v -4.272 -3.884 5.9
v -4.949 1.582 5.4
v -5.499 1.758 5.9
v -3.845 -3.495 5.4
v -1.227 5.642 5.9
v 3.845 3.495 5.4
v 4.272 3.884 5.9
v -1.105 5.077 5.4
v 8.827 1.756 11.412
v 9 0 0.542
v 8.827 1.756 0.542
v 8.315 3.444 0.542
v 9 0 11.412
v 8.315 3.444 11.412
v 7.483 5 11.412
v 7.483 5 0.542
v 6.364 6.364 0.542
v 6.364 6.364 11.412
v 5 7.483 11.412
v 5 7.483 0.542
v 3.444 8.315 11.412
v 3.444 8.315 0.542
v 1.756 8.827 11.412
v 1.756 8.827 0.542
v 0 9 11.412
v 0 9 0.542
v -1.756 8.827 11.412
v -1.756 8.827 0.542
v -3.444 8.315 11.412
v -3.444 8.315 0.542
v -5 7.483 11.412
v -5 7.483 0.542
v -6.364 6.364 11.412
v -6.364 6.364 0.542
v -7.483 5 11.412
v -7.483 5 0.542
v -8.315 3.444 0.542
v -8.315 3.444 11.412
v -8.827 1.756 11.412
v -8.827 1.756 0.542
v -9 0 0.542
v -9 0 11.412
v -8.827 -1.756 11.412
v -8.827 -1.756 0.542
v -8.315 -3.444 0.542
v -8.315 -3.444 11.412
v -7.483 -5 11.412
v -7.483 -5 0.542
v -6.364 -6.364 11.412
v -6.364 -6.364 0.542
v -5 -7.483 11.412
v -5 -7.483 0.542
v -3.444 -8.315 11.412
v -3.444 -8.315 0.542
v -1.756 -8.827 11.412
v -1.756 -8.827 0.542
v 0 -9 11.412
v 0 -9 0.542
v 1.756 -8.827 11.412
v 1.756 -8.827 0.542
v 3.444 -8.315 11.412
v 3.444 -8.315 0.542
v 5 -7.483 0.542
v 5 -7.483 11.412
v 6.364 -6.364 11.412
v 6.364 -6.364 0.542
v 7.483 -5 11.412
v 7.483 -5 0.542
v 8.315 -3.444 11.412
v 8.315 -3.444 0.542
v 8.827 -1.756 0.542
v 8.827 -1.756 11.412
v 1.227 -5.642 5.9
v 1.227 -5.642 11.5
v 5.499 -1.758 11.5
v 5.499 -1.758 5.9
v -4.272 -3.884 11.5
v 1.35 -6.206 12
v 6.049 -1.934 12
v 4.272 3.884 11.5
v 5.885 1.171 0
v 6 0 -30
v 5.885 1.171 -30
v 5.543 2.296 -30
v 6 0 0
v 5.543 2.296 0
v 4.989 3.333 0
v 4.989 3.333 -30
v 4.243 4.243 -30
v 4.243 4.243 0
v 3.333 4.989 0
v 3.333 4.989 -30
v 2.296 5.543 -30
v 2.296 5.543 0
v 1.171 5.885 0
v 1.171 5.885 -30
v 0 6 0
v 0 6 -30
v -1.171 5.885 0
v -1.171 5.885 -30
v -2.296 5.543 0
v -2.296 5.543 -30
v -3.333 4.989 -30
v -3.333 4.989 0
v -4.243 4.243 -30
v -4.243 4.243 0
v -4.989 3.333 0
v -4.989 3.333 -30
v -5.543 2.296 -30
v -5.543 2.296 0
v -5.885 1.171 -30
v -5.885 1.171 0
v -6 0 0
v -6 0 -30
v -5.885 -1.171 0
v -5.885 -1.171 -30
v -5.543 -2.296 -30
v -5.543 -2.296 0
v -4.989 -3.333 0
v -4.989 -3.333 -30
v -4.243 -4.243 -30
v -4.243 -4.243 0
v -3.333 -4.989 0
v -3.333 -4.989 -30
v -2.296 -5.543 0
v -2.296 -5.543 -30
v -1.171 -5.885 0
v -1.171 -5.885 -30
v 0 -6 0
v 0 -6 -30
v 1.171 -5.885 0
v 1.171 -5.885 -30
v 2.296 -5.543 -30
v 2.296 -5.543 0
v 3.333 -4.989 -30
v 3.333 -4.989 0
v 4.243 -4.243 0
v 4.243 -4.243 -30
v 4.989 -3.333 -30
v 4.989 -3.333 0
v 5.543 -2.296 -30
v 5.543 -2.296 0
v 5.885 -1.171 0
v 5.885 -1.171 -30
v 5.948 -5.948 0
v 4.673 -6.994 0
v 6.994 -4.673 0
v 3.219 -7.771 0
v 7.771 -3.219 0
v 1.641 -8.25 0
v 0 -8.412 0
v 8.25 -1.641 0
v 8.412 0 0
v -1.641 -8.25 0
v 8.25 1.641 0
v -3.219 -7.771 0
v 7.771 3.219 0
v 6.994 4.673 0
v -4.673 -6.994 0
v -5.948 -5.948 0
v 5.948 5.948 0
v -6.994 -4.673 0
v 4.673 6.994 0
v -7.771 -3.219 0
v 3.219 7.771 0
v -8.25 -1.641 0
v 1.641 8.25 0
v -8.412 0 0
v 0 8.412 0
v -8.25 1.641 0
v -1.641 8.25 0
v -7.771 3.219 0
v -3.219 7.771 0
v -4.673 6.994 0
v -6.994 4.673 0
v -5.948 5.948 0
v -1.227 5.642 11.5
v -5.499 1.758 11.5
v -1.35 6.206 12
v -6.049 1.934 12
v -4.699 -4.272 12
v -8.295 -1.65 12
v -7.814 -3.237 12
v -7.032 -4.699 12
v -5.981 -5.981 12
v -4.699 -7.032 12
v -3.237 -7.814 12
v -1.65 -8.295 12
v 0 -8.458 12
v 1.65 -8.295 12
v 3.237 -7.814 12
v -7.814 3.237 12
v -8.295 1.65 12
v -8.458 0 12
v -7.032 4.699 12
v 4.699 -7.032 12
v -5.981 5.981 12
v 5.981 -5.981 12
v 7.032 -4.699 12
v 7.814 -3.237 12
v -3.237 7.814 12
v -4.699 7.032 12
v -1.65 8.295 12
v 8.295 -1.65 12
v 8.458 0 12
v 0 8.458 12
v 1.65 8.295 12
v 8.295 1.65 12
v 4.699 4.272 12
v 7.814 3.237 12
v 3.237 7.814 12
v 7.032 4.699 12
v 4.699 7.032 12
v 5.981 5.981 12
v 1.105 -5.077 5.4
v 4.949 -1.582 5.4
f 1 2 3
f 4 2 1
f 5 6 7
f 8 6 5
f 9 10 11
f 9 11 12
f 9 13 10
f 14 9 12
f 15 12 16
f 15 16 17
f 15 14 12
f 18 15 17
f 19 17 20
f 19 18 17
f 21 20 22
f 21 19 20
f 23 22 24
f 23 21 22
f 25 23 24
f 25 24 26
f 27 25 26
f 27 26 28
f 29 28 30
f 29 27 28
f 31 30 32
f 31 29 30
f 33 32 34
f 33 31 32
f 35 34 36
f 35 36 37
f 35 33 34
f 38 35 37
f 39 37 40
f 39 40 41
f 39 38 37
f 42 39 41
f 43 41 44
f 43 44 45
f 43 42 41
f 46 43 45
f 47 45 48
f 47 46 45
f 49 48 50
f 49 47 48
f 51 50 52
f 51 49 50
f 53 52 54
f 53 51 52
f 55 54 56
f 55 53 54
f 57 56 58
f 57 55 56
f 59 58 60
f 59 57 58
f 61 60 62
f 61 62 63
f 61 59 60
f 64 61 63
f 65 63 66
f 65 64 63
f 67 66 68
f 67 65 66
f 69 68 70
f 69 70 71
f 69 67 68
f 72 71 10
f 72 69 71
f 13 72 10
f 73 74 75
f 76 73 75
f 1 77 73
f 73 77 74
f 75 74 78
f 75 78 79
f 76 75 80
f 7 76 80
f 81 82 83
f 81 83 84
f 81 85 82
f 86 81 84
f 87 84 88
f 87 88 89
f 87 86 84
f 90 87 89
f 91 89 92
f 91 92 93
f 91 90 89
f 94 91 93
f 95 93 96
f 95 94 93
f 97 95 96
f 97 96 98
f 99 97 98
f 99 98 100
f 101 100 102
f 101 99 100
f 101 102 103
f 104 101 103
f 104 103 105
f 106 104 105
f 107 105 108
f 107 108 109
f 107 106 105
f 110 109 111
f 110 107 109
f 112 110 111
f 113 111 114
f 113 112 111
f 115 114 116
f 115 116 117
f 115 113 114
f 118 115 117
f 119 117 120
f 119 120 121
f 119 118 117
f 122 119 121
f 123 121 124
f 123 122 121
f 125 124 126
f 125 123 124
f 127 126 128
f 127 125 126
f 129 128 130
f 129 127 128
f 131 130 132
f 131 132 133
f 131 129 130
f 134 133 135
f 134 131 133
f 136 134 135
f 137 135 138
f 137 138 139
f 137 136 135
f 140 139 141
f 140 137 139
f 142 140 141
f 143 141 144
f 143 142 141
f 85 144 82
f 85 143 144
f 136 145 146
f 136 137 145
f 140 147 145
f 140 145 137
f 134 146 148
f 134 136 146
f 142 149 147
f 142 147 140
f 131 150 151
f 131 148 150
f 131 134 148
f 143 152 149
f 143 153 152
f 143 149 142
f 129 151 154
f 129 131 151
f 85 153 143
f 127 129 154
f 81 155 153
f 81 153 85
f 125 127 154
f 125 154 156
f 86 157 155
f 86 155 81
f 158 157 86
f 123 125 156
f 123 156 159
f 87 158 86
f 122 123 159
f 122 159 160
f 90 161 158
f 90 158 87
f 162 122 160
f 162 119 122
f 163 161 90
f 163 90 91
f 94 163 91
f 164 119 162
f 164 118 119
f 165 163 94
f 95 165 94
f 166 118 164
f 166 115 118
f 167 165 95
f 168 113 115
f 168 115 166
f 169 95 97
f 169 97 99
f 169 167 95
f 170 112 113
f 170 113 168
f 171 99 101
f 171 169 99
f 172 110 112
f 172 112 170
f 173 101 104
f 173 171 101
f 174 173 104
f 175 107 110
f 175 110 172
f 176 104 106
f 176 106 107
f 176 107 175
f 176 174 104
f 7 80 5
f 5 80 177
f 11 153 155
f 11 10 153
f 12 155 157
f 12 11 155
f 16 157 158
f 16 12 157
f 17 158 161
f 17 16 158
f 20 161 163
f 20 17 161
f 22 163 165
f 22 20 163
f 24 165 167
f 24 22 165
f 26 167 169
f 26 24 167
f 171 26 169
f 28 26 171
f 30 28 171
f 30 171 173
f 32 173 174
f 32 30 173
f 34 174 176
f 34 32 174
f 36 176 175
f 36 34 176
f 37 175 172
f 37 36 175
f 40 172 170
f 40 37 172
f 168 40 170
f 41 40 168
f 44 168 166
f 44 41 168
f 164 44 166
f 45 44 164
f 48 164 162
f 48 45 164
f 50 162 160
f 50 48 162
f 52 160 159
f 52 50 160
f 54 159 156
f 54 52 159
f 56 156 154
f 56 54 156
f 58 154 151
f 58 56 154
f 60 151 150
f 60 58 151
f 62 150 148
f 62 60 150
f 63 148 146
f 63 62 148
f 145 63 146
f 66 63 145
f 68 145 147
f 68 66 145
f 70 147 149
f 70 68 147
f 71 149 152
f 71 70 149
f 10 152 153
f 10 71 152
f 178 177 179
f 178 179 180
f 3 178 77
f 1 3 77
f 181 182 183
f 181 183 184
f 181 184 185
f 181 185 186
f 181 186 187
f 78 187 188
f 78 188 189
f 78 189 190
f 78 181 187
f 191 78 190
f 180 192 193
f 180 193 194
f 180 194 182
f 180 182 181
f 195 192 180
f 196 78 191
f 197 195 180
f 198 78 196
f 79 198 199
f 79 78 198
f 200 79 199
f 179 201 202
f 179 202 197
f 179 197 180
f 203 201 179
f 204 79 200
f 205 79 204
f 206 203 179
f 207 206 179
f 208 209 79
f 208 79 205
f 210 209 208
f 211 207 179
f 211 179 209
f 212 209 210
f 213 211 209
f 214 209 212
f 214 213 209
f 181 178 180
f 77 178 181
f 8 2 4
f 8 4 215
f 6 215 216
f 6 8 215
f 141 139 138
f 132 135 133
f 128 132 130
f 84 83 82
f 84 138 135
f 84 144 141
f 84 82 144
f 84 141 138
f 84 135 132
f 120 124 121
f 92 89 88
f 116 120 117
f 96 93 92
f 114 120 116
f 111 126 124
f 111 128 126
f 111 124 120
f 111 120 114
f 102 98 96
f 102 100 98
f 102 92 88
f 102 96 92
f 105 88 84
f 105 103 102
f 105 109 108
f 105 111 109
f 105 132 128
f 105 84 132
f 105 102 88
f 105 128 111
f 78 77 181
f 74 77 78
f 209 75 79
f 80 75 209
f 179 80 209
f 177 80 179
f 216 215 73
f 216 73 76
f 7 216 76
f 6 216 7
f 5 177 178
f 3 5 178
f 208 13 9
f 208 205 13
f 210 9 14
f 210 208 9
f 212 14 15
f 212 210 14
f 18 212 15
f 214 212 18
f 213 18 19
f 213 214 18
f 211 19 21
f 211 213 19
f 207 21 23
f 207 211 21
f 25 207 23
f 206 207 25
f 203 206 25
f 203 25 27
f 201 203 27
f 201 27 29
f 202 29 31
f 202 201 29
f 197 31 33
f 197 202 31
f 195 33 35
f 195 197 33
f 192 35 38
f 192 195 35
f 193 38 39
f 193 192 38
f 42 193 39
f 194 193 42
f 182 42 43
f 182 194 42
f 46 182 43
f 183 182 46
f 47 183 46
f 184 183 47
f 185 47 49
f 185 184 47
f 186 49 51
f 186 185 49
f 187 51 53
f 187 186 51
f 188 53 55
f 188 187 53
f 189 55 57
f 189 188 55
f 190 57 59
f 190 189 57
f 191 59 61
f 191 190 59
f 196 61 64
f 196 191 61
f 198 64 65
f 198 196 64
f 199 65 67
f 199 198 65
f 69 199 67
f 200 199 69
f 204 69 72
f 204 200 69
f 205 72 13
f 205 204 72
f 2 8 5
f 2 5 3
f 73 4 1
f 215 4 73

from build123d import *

# Parameters (mm, degrees)
F3_DEPTH = 6.6
F4_SIZE  = 0.5


with BuildPart() as f1:
    # F0 (on Front) → F1 (revolve)
    with BuildSketch(Plane.XZ):
        Polygon((8.457855, 12), (0, 12), (0, -30), (6, -30), (6, 0), (8.411715, 0), (9, 0.542145), (9, 11.411715), align=None)
    revolve(axis=Axis((0, 0, -9), (0, 0, 1)))

    # F2 (on face) → F3 (cut)
    with BuildSketch(Plane.XY.offset(12)):
        Polygon((-1.227341, 5.641539), (-5.499387, 1.757861), (-4.272046, -3.883678), (1.227341, -5.641539), (5.499387, -1.757861), (4.272046, 3.883678), align=None)
    extrude(amount=-F3_DEPTH, mode=Mode.SUBTRACT)

    # F4
    f4_edges = [f1.edges().sort_by_distance(p)[0] for p in [
        (3.363364, -3.6997, 12),
        (-1.522352, -4.762609, 12),
        (-4.885716, -1.062909, 12),
        (-3.363364, 3.6997, 12),
        (1.522352, 4.762609, 12),
        (4.885716, 1.062909, 12),
        (4.885716, 1.062909, 5.4),
        (3.363364, -3.6997, 5.4),
        (-1.522352, -4.762609, 5.4),
        (-4.885716, -1.062909, 5.4),
        (-3.363364, 3.6997, 5.4),
        (1.522352, 4.762609, 5.4),
    ]]
    chamfer(f4_edges, length=F4_SIZE)


solid = f1.part
